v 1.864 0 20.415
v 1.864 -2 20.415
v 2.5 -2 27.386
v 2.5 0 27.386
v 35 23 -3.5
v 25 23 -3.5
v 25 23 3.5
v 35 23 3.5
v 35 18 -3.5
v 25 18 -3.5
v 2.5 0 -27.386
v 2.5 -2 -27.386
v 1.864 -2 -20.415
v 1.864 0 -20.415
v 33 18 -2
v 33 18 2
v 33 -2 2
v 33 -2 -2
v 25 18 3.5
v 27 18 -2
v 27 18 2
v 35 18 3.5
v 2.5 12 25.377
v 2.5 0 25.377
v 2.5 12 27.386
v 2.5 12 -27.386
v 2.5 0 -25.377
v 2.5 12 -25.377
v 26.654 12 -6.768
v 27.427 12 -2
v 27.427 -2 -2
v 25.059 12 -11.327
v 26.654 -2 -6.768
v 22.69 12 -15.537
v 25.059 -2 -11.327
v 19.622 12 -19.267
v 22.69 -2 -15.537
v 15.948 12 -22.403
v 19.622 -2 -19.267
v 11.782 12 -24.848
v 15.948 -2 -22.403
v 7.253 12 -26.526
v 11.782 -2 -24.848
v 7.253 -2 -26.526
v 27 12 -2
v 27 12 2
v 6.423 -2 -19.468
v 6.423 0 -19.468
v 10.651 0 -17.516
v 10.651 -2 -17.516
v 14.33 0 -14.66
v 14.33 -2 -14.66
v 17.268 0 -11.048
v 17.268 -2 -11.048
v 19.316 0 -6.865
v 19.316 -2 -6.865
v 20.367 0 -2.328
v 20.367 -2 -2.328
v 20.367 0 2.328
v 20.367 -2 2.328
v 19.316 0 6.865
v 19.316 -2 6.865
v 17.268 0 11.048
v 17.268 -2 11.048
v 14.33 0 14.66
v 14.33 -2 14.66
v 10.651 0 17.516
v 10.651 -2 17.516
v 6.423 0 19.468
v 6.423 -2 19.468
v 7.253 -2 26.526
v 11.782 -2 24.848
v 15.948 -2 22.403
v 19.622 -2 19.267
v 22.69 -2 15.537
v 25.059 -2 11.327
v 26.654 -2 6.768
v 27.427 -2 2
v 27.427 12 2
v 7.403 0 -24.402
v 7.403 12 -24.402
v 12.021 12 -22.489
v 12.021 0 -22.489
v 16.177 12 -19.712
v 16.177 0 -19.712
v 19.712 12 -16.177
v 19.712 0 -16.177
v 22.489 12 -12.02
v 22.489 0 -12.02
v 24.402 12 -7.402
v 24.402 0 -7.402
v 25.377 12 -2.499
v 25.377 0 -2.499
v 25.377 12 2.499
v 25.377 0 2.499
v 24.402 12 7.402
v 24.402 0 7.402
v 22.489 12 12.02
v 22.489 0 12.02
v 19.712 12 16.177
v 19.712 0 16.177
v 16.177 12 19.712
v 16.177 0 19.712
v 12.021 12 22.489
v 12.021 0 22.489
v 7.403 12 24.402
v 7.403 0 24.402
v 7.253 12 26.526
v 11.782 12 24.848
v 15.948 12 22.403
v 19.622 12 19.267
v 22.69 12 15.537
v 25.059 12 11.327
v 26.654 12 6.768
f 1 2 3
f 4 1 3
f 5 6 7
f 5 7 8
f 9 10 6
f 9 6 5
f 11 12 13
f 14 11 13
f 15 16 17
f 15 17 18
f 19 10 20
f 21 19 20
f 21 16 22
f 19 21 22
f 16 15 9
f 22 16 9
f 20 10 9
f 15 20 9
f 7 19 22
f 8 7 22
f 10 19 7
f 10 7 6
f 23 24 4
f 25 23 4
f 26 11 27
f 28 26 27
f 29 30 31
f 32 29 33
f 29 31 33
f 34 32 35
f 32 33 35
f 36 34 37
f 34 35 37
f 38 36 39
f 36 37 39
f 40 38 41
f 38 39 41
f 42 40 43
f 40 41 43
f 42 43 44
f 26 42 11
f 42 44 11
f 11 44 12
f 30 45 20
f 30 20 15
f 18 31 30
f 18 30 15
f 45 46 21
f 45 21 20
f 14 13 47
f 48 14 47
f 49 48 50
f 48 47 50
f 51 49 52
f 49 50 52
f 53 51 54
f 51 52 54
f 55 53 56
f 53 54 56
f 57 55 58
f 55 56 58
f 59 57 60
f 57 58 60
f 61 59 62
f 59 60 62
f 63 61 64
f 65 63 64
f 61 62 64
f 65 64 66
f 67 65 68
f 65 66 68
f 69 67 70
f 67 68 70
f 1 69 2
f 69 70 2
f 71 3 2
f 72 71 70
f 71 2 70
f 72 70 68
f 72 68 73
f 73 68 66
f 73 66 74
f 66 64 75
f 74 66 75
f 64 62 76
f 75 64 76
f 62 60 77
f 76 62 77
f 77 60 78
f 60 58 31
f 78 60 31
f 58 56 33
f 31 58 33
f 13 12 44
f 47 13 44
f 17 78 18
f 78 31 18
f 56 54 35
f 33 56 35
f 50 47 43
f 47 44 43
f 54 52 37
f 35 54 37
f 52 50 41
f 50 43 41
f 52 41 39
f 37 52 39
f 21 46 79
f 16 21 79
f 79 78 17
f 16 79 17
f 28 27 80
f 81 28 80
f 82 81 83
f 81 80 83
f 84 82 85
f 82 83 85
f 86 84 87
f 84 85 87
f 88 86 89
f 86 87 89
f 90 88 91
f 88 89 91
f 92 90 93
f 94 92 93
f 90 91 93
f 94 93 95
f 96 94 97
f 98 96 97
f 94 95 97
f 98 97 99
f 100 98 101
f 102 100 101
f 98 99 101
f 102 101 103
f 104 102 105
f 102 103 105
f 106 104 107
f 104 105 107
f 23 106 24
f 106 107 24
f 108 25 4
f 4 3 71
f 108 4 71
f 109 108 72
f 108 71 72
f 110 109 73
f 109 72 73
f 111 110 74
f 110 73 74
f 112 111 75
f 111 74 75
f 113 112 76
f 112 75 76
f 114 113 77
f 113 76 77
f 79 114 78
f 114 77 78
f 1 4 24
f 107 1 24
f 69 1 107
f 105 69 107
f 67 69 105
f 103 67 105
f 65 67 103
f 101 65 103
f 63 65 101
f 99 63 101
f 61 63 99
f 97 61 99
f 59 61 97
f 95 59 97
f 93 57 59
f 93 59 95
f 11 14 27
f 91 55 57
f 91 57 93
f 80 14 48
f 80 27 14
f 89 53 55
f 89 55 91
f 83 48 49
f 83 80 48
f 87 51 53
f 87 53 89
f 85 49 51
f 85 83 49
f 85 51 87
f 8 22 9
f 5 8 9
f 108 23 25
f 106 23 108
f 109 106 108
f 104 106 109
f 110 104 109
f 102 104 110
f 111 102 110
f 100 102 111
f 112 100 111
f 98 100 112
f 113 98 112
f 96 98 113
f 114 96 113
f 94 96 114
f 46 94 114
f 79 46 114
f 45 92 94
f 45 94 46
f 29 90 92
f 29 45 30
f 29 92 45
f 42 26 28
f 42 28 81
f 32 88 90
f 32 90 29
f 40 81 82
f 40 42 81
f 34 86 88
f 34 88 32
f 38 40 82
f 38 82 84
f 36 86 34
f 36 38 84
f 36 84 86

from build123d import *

# Parameters (mm, degrees)
BOSS_EXTRUDE1_DEPTH = 12
BOSS_EXTRUDE2_START = -2
BOSS_EXTRUDE2_DEPTH = 2
SKETCH4_W           = 6
SKETCH4_H           = 4
BOSS_EXTRUDE3_DEPTH = 20
SKETCH5_W           = 10
SKETCH5_H           = 7
BOSS_EXTRUDE4_DEPTH = 5


with BuildPart() as part:
    # Sketch1 → Boss-Extrude1 (new body)
    with BuildSketch(Plane(origin=(0, 0, 0), x_dir=(1, 0, 0), z_dir=(0, 1, 0))):
        with BuildLine():
            Line((2.5, 27.386127875), (2.5, 25.377155081))
            ThreePointArc((2.5, 25.377155081), (25.5, 0), (2.5, -25.377155081))
            Line((2.5, -25.377155081), (2.5, -27.386127875))
            ThreePointArc((2.5, -27.386127875), (27.5, 0), (2.5, 27.386127875))
        make_face()
    extrude(amount=BOSS_EXTRUDE1_DEPTH)

    # Sketch2 → Boss-Extrude2 (add)
    with BuildSketch(Plane(origin=(0, 0, 0), x_dir=(1, 0, 0), z_dir=(0, 1, 0)).offset(BOSS_EXTRUDE2_START)):
        with BuildLine():
            Line((2.5, 27.386127875), (1.863636364, 20.415113507))
            ThreePointArc((1.863636364, 20.415113507), (20.5, 0), (1.863636364, -20.415113507))
            Line((1.863636364, -20.415113507), (2.5, -27.386127875))
            ThreePointArc((2.5, -27.386127875), (27.5, 0), (2.5, 27.386127875))
        make_face()
    extrude(amount=BOSS_EXTRUDE2_DEPTH)

    # Sketch4 → Boss-Extrude3 (add)
    with BuildSketch(Plane(origin=(0, -2, 0), x_dir=(1, 0, 0), z_dir=(0, 1, 0))):
        with Locations((30, 0)):
            Rectangle(SKETCH4_W, SKETCH4_H)
    extrude(amount=BOSS_EXTRUDE3_DEPTH)

    # Sketch5 → Boss-Extrude4 (add)
    with BuildSketch(Plane(origin=(0, 18, 0), x_dir=(1, 0, 0), z_dir=(0, 1, 0))):
        with Locations((30, 0)):
            Rectangle(SKETCH5_W, SKETCH5_H)
    extrude(amount=BOSS_EXTRUDE4_DEPTH)


solid = part.part
